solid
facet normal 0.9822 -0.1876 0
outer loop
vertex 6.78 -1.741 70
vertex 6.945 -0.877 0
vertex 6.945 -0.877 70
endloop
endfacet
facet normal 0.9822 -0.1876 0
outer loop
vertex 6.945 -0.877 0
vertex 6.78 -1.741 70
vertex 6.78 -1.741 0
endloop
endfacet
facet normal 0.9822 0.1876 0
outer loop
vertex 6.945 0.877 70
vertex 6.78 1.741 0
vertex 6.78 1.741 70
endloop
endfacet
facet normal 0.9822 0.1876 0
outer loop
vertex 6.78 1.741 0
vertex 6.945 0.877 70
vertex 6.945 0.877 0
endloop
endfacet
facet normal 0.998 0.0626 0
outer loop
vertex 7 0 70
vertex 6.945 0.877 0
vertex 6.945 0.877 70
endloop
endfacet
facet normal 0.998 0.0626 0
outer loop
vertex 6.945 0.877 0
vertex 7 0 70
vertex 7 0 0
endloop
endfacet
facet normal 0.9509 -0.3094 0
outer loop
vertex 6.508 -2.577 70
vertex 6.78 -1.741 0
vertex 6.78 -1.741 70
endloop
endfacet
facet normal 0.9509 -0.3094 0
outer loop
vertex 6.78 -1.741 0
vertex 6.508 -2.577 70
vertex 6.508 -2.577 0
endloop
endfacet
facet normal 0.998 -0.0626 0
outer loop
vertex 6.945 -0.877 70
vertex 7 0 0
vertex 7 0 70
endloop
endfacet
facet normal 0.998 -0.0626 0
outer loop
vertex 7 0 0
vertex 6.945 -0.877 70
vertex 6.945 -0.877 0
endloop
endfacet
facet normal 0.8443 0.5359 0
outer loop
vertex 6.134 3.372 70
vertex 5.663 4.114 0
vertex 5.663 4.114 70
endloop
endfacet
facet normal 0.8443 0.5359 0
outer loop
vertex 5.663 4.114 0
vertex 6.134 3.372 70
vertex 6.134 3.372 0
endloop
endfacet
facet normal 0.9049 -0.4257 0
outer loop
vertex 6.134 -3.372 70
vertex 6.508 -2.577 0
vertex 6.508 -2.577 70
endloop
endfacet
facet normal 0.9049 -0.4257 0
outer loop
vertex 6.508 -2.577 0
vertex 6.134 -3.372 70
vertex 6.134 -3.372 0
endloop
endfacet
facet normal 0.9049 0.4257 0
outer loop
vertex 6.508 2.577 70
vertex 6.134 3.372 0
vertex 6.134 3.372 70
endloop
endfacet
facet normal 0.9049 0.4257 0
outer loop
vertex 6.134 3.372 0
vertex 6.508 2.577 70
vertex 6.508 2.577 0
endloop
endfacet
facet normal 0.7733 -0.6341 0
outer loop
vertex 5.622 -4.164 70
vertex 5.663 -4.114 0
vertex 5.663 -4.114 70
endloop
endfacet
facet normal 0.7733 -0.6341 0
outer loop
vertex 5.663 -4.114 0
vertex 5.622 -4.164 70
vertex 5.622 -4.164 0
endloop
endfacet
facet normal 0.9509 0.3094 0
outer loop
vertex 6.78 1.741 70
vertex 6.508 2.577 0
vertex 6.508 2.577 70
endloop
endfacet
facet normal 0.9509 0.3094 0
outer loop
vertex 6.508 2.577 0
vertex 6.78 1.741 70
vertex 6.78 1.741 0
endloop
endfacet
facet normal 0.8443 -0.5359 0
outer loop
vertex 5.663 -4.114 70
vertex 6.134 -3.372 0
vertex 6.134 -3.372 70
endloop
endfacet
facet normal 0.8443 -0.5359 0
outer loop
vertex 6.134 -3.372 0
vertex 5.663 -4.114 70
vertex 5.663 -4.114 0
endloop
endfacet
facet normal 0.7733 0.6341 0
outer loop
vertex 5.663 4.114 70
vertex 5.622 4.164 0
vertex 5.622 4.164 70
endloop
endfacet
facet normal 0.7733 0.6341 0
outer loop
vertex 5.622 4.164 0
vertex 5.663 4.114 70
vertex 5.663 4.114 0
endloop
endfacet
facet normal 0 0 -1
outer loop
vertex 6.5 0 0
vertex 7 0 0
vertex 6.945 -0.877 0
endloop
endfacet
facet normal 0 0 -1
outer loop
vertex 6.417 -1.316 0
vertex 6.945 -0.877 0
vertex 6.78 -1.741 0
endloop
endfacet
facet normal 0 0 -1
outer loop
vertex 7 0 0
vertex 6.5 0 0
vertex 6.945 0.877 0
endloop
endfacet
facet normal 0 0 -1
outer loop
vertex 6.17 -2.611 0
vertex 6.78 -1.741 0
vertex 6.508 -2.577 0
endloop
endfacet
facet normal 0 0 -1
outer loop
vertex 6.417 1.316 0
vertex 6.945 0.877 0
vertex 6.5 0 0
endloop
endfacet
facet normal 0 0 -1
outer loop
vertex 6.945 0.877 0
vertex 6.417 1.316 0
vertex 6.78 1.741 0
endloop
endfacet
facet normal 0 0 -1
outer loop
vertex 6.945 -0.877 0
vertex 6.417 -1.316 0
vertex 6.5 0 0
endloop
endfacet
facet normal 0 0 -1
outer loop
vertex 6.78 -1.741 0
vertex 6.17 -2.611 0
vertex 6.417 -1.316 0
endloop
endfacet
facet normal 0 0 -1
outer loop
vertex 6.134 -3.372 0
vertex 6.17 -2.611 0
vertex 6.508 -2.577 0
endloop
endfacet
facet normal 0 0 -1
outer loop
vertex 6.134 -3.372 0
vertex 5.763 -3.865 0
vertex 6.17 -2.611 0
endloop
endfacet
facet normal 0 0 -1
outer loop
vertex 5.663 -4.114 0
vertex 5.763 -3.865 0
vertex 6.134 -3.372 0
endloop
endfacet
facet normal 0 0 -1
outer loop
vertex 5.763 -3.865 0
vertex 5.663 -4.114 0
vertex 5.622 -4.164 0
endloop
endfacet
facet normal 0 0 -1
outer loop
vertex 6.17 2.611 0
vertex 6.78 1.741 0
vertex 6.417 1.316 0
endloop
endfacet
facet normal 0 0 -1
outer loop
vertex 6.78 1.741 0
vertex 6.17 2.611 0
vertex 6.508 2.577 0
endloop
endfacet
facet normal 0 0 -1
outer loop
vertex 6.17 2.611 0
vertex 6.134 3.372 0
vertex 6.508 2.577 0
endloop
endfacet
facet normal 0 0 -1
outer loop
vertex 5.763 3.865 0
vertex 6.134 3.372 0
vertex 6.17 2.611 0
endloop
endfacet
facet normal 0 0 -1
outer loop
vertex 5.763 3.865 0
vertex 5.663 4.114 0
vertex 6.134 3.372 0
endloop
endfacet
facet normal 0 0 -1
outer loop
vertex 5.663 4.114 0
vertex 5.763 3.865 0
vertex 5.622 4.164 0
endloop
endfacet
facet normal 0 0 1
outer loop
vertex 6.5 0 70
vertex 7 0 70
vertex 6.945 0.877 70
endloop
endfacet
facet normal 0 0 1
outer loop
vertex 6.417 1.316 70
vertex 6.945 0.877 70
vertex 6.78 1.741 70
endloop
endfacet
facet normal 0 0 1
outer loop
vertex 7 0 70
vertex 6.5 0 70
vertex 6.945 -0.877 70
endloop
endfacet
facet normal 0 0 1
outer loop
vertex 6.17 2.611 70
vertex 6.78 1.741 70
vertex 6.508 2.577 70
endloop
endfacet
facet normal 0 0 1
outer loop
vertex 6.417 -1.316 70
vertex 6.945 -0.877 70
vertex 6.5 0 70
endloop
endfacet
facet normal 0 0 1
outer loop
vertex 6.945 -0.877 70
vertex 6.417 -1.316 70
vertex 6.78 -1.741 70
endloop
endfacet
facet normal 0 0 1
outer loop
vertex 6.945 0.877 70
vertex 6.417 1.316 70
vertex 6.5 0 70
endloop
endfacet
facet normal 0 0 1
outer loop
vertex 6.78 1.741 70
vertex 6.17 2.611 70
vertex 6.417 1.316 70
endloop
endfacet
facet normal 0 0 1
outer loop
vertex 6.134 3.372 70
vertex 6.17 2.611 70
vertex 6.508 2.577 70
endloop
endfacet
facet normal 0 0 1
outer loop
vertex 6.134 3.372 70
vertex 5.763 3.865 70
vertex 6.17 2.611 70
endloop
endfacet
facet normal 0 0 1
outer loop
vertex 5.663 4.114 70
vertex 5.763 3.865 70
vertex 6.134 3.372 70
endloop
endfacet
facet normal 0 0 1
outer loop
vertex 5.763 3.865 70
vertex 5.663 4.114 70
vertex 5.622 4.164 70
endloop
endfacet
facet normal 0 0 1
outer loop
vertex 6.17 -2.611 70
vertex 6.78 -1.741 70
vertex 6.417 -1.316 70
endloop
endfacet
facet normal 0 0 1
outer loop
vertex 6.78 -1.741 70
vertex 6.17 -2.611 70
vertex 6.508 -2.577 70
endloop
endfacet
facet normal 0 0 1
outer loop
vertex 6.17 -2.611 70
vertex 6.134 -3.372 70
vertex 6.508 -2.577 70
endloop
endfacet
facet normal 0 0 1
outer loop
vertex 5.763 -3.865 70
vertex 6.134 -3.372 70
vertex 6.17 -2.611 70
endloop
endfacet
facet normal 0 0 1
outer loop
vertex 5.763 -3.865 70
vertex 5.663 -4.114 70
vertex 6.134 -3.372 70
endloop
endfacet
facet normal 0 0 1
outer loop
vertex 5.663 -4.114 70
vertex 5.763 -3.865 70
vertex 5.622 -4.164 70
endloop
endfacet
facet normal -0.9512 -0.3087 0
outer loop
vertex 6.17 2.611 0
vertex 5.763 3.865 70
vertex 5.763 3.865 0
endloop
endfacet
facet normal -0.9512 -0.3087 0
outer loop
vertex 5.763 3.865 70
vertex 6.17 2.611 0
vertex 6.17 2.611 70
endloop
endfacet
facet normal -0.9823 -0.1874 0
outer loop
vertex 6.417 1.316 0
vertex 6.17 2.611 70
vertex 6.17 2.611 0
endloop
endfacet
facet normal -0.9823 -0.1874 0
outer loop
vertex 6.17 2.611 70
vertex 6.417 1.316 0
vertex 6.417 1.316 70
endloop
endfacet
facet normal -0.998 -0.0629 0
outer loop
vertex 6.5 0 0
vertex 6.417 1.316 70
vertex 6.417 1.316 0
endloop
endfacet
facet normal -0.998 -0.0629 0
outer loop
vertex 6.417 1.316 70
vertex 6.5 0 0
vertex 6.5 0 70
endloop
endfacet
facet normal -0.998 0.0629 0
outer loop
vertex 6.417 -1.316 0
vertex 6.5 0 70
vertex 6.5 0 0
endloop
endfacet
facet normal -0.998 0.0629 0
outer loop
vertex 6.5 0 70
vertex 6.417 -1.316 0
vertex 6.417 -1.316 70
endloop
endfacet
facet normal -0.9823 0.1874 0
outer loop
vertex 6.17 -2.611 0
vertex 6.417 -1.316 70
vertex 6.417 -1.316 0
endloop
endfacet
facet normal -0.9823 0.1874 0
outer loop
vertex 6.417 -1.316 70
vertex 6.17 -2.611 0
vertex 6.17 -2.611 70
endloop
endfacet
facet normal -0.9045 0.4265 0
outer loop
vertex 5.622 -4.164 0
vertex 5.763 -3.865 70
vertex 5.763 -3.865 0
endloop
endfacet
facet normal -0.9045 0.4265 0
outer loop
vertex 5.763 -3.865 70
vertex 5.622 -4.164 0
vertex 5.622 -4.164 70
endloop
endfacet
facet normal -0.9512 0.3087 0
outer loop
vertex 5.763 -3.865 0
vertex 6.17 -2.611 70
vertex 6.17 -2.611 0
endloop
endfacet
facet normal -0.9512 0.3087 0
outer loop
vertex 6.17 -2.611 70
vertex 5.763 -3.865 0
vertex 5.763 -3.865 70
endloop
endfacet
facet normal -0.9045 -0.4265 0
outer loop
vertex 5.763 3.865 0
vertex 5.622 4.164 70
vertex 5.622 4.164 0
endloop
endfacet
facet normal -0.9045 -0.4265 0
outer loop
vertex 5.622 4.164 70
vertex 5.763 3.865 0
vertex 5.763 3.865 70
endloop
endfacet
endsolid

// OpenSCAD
$fn = 50;


difference() {
	union() {
		cylinder(h = 70, r = 7.0000000000);
		translate(v = [-7.0000000000, 0, 0]) {
			cylinder(h = 70, r = 7.0000000000);
		}
	}
	union() {
		cylinder(h = 70, r = 3.2500000000);
		cylinder(h = 70, r = 1.8000000000);
		cylinder(h = 70, r = 1.8000000000);
		cylinder(h = 70, r = 1.8000000000);
		translate(v = [-11.5000000000, 0, 0]) {
			hull() {
				translate(v = [-3.7500000000, 0.0000000000, 0]) {
					cylinder(h = 70, r = 7.5000000000);
				}
				translate(v = [3.7500000000, 0.0000000000, 0]) {
					cylinder(h = 70, r = 7.5000000000);
				}
				translate(v = [-3.7500000000, -0.0000000000, 0]) {
					cylinder(h = 70, r = 7.5000000000);
				}
				translate(v = [3.7500000000, -0.0000000000, 0]) {
					cylinder(h = 70, r = 7.5000000000);
				}
			}
		}
		translate(v = [-4.0000000000, 0, 0.0000000000]) {
			cylinder(h = 70, r = 10.5000000000);
		}
	}
}
